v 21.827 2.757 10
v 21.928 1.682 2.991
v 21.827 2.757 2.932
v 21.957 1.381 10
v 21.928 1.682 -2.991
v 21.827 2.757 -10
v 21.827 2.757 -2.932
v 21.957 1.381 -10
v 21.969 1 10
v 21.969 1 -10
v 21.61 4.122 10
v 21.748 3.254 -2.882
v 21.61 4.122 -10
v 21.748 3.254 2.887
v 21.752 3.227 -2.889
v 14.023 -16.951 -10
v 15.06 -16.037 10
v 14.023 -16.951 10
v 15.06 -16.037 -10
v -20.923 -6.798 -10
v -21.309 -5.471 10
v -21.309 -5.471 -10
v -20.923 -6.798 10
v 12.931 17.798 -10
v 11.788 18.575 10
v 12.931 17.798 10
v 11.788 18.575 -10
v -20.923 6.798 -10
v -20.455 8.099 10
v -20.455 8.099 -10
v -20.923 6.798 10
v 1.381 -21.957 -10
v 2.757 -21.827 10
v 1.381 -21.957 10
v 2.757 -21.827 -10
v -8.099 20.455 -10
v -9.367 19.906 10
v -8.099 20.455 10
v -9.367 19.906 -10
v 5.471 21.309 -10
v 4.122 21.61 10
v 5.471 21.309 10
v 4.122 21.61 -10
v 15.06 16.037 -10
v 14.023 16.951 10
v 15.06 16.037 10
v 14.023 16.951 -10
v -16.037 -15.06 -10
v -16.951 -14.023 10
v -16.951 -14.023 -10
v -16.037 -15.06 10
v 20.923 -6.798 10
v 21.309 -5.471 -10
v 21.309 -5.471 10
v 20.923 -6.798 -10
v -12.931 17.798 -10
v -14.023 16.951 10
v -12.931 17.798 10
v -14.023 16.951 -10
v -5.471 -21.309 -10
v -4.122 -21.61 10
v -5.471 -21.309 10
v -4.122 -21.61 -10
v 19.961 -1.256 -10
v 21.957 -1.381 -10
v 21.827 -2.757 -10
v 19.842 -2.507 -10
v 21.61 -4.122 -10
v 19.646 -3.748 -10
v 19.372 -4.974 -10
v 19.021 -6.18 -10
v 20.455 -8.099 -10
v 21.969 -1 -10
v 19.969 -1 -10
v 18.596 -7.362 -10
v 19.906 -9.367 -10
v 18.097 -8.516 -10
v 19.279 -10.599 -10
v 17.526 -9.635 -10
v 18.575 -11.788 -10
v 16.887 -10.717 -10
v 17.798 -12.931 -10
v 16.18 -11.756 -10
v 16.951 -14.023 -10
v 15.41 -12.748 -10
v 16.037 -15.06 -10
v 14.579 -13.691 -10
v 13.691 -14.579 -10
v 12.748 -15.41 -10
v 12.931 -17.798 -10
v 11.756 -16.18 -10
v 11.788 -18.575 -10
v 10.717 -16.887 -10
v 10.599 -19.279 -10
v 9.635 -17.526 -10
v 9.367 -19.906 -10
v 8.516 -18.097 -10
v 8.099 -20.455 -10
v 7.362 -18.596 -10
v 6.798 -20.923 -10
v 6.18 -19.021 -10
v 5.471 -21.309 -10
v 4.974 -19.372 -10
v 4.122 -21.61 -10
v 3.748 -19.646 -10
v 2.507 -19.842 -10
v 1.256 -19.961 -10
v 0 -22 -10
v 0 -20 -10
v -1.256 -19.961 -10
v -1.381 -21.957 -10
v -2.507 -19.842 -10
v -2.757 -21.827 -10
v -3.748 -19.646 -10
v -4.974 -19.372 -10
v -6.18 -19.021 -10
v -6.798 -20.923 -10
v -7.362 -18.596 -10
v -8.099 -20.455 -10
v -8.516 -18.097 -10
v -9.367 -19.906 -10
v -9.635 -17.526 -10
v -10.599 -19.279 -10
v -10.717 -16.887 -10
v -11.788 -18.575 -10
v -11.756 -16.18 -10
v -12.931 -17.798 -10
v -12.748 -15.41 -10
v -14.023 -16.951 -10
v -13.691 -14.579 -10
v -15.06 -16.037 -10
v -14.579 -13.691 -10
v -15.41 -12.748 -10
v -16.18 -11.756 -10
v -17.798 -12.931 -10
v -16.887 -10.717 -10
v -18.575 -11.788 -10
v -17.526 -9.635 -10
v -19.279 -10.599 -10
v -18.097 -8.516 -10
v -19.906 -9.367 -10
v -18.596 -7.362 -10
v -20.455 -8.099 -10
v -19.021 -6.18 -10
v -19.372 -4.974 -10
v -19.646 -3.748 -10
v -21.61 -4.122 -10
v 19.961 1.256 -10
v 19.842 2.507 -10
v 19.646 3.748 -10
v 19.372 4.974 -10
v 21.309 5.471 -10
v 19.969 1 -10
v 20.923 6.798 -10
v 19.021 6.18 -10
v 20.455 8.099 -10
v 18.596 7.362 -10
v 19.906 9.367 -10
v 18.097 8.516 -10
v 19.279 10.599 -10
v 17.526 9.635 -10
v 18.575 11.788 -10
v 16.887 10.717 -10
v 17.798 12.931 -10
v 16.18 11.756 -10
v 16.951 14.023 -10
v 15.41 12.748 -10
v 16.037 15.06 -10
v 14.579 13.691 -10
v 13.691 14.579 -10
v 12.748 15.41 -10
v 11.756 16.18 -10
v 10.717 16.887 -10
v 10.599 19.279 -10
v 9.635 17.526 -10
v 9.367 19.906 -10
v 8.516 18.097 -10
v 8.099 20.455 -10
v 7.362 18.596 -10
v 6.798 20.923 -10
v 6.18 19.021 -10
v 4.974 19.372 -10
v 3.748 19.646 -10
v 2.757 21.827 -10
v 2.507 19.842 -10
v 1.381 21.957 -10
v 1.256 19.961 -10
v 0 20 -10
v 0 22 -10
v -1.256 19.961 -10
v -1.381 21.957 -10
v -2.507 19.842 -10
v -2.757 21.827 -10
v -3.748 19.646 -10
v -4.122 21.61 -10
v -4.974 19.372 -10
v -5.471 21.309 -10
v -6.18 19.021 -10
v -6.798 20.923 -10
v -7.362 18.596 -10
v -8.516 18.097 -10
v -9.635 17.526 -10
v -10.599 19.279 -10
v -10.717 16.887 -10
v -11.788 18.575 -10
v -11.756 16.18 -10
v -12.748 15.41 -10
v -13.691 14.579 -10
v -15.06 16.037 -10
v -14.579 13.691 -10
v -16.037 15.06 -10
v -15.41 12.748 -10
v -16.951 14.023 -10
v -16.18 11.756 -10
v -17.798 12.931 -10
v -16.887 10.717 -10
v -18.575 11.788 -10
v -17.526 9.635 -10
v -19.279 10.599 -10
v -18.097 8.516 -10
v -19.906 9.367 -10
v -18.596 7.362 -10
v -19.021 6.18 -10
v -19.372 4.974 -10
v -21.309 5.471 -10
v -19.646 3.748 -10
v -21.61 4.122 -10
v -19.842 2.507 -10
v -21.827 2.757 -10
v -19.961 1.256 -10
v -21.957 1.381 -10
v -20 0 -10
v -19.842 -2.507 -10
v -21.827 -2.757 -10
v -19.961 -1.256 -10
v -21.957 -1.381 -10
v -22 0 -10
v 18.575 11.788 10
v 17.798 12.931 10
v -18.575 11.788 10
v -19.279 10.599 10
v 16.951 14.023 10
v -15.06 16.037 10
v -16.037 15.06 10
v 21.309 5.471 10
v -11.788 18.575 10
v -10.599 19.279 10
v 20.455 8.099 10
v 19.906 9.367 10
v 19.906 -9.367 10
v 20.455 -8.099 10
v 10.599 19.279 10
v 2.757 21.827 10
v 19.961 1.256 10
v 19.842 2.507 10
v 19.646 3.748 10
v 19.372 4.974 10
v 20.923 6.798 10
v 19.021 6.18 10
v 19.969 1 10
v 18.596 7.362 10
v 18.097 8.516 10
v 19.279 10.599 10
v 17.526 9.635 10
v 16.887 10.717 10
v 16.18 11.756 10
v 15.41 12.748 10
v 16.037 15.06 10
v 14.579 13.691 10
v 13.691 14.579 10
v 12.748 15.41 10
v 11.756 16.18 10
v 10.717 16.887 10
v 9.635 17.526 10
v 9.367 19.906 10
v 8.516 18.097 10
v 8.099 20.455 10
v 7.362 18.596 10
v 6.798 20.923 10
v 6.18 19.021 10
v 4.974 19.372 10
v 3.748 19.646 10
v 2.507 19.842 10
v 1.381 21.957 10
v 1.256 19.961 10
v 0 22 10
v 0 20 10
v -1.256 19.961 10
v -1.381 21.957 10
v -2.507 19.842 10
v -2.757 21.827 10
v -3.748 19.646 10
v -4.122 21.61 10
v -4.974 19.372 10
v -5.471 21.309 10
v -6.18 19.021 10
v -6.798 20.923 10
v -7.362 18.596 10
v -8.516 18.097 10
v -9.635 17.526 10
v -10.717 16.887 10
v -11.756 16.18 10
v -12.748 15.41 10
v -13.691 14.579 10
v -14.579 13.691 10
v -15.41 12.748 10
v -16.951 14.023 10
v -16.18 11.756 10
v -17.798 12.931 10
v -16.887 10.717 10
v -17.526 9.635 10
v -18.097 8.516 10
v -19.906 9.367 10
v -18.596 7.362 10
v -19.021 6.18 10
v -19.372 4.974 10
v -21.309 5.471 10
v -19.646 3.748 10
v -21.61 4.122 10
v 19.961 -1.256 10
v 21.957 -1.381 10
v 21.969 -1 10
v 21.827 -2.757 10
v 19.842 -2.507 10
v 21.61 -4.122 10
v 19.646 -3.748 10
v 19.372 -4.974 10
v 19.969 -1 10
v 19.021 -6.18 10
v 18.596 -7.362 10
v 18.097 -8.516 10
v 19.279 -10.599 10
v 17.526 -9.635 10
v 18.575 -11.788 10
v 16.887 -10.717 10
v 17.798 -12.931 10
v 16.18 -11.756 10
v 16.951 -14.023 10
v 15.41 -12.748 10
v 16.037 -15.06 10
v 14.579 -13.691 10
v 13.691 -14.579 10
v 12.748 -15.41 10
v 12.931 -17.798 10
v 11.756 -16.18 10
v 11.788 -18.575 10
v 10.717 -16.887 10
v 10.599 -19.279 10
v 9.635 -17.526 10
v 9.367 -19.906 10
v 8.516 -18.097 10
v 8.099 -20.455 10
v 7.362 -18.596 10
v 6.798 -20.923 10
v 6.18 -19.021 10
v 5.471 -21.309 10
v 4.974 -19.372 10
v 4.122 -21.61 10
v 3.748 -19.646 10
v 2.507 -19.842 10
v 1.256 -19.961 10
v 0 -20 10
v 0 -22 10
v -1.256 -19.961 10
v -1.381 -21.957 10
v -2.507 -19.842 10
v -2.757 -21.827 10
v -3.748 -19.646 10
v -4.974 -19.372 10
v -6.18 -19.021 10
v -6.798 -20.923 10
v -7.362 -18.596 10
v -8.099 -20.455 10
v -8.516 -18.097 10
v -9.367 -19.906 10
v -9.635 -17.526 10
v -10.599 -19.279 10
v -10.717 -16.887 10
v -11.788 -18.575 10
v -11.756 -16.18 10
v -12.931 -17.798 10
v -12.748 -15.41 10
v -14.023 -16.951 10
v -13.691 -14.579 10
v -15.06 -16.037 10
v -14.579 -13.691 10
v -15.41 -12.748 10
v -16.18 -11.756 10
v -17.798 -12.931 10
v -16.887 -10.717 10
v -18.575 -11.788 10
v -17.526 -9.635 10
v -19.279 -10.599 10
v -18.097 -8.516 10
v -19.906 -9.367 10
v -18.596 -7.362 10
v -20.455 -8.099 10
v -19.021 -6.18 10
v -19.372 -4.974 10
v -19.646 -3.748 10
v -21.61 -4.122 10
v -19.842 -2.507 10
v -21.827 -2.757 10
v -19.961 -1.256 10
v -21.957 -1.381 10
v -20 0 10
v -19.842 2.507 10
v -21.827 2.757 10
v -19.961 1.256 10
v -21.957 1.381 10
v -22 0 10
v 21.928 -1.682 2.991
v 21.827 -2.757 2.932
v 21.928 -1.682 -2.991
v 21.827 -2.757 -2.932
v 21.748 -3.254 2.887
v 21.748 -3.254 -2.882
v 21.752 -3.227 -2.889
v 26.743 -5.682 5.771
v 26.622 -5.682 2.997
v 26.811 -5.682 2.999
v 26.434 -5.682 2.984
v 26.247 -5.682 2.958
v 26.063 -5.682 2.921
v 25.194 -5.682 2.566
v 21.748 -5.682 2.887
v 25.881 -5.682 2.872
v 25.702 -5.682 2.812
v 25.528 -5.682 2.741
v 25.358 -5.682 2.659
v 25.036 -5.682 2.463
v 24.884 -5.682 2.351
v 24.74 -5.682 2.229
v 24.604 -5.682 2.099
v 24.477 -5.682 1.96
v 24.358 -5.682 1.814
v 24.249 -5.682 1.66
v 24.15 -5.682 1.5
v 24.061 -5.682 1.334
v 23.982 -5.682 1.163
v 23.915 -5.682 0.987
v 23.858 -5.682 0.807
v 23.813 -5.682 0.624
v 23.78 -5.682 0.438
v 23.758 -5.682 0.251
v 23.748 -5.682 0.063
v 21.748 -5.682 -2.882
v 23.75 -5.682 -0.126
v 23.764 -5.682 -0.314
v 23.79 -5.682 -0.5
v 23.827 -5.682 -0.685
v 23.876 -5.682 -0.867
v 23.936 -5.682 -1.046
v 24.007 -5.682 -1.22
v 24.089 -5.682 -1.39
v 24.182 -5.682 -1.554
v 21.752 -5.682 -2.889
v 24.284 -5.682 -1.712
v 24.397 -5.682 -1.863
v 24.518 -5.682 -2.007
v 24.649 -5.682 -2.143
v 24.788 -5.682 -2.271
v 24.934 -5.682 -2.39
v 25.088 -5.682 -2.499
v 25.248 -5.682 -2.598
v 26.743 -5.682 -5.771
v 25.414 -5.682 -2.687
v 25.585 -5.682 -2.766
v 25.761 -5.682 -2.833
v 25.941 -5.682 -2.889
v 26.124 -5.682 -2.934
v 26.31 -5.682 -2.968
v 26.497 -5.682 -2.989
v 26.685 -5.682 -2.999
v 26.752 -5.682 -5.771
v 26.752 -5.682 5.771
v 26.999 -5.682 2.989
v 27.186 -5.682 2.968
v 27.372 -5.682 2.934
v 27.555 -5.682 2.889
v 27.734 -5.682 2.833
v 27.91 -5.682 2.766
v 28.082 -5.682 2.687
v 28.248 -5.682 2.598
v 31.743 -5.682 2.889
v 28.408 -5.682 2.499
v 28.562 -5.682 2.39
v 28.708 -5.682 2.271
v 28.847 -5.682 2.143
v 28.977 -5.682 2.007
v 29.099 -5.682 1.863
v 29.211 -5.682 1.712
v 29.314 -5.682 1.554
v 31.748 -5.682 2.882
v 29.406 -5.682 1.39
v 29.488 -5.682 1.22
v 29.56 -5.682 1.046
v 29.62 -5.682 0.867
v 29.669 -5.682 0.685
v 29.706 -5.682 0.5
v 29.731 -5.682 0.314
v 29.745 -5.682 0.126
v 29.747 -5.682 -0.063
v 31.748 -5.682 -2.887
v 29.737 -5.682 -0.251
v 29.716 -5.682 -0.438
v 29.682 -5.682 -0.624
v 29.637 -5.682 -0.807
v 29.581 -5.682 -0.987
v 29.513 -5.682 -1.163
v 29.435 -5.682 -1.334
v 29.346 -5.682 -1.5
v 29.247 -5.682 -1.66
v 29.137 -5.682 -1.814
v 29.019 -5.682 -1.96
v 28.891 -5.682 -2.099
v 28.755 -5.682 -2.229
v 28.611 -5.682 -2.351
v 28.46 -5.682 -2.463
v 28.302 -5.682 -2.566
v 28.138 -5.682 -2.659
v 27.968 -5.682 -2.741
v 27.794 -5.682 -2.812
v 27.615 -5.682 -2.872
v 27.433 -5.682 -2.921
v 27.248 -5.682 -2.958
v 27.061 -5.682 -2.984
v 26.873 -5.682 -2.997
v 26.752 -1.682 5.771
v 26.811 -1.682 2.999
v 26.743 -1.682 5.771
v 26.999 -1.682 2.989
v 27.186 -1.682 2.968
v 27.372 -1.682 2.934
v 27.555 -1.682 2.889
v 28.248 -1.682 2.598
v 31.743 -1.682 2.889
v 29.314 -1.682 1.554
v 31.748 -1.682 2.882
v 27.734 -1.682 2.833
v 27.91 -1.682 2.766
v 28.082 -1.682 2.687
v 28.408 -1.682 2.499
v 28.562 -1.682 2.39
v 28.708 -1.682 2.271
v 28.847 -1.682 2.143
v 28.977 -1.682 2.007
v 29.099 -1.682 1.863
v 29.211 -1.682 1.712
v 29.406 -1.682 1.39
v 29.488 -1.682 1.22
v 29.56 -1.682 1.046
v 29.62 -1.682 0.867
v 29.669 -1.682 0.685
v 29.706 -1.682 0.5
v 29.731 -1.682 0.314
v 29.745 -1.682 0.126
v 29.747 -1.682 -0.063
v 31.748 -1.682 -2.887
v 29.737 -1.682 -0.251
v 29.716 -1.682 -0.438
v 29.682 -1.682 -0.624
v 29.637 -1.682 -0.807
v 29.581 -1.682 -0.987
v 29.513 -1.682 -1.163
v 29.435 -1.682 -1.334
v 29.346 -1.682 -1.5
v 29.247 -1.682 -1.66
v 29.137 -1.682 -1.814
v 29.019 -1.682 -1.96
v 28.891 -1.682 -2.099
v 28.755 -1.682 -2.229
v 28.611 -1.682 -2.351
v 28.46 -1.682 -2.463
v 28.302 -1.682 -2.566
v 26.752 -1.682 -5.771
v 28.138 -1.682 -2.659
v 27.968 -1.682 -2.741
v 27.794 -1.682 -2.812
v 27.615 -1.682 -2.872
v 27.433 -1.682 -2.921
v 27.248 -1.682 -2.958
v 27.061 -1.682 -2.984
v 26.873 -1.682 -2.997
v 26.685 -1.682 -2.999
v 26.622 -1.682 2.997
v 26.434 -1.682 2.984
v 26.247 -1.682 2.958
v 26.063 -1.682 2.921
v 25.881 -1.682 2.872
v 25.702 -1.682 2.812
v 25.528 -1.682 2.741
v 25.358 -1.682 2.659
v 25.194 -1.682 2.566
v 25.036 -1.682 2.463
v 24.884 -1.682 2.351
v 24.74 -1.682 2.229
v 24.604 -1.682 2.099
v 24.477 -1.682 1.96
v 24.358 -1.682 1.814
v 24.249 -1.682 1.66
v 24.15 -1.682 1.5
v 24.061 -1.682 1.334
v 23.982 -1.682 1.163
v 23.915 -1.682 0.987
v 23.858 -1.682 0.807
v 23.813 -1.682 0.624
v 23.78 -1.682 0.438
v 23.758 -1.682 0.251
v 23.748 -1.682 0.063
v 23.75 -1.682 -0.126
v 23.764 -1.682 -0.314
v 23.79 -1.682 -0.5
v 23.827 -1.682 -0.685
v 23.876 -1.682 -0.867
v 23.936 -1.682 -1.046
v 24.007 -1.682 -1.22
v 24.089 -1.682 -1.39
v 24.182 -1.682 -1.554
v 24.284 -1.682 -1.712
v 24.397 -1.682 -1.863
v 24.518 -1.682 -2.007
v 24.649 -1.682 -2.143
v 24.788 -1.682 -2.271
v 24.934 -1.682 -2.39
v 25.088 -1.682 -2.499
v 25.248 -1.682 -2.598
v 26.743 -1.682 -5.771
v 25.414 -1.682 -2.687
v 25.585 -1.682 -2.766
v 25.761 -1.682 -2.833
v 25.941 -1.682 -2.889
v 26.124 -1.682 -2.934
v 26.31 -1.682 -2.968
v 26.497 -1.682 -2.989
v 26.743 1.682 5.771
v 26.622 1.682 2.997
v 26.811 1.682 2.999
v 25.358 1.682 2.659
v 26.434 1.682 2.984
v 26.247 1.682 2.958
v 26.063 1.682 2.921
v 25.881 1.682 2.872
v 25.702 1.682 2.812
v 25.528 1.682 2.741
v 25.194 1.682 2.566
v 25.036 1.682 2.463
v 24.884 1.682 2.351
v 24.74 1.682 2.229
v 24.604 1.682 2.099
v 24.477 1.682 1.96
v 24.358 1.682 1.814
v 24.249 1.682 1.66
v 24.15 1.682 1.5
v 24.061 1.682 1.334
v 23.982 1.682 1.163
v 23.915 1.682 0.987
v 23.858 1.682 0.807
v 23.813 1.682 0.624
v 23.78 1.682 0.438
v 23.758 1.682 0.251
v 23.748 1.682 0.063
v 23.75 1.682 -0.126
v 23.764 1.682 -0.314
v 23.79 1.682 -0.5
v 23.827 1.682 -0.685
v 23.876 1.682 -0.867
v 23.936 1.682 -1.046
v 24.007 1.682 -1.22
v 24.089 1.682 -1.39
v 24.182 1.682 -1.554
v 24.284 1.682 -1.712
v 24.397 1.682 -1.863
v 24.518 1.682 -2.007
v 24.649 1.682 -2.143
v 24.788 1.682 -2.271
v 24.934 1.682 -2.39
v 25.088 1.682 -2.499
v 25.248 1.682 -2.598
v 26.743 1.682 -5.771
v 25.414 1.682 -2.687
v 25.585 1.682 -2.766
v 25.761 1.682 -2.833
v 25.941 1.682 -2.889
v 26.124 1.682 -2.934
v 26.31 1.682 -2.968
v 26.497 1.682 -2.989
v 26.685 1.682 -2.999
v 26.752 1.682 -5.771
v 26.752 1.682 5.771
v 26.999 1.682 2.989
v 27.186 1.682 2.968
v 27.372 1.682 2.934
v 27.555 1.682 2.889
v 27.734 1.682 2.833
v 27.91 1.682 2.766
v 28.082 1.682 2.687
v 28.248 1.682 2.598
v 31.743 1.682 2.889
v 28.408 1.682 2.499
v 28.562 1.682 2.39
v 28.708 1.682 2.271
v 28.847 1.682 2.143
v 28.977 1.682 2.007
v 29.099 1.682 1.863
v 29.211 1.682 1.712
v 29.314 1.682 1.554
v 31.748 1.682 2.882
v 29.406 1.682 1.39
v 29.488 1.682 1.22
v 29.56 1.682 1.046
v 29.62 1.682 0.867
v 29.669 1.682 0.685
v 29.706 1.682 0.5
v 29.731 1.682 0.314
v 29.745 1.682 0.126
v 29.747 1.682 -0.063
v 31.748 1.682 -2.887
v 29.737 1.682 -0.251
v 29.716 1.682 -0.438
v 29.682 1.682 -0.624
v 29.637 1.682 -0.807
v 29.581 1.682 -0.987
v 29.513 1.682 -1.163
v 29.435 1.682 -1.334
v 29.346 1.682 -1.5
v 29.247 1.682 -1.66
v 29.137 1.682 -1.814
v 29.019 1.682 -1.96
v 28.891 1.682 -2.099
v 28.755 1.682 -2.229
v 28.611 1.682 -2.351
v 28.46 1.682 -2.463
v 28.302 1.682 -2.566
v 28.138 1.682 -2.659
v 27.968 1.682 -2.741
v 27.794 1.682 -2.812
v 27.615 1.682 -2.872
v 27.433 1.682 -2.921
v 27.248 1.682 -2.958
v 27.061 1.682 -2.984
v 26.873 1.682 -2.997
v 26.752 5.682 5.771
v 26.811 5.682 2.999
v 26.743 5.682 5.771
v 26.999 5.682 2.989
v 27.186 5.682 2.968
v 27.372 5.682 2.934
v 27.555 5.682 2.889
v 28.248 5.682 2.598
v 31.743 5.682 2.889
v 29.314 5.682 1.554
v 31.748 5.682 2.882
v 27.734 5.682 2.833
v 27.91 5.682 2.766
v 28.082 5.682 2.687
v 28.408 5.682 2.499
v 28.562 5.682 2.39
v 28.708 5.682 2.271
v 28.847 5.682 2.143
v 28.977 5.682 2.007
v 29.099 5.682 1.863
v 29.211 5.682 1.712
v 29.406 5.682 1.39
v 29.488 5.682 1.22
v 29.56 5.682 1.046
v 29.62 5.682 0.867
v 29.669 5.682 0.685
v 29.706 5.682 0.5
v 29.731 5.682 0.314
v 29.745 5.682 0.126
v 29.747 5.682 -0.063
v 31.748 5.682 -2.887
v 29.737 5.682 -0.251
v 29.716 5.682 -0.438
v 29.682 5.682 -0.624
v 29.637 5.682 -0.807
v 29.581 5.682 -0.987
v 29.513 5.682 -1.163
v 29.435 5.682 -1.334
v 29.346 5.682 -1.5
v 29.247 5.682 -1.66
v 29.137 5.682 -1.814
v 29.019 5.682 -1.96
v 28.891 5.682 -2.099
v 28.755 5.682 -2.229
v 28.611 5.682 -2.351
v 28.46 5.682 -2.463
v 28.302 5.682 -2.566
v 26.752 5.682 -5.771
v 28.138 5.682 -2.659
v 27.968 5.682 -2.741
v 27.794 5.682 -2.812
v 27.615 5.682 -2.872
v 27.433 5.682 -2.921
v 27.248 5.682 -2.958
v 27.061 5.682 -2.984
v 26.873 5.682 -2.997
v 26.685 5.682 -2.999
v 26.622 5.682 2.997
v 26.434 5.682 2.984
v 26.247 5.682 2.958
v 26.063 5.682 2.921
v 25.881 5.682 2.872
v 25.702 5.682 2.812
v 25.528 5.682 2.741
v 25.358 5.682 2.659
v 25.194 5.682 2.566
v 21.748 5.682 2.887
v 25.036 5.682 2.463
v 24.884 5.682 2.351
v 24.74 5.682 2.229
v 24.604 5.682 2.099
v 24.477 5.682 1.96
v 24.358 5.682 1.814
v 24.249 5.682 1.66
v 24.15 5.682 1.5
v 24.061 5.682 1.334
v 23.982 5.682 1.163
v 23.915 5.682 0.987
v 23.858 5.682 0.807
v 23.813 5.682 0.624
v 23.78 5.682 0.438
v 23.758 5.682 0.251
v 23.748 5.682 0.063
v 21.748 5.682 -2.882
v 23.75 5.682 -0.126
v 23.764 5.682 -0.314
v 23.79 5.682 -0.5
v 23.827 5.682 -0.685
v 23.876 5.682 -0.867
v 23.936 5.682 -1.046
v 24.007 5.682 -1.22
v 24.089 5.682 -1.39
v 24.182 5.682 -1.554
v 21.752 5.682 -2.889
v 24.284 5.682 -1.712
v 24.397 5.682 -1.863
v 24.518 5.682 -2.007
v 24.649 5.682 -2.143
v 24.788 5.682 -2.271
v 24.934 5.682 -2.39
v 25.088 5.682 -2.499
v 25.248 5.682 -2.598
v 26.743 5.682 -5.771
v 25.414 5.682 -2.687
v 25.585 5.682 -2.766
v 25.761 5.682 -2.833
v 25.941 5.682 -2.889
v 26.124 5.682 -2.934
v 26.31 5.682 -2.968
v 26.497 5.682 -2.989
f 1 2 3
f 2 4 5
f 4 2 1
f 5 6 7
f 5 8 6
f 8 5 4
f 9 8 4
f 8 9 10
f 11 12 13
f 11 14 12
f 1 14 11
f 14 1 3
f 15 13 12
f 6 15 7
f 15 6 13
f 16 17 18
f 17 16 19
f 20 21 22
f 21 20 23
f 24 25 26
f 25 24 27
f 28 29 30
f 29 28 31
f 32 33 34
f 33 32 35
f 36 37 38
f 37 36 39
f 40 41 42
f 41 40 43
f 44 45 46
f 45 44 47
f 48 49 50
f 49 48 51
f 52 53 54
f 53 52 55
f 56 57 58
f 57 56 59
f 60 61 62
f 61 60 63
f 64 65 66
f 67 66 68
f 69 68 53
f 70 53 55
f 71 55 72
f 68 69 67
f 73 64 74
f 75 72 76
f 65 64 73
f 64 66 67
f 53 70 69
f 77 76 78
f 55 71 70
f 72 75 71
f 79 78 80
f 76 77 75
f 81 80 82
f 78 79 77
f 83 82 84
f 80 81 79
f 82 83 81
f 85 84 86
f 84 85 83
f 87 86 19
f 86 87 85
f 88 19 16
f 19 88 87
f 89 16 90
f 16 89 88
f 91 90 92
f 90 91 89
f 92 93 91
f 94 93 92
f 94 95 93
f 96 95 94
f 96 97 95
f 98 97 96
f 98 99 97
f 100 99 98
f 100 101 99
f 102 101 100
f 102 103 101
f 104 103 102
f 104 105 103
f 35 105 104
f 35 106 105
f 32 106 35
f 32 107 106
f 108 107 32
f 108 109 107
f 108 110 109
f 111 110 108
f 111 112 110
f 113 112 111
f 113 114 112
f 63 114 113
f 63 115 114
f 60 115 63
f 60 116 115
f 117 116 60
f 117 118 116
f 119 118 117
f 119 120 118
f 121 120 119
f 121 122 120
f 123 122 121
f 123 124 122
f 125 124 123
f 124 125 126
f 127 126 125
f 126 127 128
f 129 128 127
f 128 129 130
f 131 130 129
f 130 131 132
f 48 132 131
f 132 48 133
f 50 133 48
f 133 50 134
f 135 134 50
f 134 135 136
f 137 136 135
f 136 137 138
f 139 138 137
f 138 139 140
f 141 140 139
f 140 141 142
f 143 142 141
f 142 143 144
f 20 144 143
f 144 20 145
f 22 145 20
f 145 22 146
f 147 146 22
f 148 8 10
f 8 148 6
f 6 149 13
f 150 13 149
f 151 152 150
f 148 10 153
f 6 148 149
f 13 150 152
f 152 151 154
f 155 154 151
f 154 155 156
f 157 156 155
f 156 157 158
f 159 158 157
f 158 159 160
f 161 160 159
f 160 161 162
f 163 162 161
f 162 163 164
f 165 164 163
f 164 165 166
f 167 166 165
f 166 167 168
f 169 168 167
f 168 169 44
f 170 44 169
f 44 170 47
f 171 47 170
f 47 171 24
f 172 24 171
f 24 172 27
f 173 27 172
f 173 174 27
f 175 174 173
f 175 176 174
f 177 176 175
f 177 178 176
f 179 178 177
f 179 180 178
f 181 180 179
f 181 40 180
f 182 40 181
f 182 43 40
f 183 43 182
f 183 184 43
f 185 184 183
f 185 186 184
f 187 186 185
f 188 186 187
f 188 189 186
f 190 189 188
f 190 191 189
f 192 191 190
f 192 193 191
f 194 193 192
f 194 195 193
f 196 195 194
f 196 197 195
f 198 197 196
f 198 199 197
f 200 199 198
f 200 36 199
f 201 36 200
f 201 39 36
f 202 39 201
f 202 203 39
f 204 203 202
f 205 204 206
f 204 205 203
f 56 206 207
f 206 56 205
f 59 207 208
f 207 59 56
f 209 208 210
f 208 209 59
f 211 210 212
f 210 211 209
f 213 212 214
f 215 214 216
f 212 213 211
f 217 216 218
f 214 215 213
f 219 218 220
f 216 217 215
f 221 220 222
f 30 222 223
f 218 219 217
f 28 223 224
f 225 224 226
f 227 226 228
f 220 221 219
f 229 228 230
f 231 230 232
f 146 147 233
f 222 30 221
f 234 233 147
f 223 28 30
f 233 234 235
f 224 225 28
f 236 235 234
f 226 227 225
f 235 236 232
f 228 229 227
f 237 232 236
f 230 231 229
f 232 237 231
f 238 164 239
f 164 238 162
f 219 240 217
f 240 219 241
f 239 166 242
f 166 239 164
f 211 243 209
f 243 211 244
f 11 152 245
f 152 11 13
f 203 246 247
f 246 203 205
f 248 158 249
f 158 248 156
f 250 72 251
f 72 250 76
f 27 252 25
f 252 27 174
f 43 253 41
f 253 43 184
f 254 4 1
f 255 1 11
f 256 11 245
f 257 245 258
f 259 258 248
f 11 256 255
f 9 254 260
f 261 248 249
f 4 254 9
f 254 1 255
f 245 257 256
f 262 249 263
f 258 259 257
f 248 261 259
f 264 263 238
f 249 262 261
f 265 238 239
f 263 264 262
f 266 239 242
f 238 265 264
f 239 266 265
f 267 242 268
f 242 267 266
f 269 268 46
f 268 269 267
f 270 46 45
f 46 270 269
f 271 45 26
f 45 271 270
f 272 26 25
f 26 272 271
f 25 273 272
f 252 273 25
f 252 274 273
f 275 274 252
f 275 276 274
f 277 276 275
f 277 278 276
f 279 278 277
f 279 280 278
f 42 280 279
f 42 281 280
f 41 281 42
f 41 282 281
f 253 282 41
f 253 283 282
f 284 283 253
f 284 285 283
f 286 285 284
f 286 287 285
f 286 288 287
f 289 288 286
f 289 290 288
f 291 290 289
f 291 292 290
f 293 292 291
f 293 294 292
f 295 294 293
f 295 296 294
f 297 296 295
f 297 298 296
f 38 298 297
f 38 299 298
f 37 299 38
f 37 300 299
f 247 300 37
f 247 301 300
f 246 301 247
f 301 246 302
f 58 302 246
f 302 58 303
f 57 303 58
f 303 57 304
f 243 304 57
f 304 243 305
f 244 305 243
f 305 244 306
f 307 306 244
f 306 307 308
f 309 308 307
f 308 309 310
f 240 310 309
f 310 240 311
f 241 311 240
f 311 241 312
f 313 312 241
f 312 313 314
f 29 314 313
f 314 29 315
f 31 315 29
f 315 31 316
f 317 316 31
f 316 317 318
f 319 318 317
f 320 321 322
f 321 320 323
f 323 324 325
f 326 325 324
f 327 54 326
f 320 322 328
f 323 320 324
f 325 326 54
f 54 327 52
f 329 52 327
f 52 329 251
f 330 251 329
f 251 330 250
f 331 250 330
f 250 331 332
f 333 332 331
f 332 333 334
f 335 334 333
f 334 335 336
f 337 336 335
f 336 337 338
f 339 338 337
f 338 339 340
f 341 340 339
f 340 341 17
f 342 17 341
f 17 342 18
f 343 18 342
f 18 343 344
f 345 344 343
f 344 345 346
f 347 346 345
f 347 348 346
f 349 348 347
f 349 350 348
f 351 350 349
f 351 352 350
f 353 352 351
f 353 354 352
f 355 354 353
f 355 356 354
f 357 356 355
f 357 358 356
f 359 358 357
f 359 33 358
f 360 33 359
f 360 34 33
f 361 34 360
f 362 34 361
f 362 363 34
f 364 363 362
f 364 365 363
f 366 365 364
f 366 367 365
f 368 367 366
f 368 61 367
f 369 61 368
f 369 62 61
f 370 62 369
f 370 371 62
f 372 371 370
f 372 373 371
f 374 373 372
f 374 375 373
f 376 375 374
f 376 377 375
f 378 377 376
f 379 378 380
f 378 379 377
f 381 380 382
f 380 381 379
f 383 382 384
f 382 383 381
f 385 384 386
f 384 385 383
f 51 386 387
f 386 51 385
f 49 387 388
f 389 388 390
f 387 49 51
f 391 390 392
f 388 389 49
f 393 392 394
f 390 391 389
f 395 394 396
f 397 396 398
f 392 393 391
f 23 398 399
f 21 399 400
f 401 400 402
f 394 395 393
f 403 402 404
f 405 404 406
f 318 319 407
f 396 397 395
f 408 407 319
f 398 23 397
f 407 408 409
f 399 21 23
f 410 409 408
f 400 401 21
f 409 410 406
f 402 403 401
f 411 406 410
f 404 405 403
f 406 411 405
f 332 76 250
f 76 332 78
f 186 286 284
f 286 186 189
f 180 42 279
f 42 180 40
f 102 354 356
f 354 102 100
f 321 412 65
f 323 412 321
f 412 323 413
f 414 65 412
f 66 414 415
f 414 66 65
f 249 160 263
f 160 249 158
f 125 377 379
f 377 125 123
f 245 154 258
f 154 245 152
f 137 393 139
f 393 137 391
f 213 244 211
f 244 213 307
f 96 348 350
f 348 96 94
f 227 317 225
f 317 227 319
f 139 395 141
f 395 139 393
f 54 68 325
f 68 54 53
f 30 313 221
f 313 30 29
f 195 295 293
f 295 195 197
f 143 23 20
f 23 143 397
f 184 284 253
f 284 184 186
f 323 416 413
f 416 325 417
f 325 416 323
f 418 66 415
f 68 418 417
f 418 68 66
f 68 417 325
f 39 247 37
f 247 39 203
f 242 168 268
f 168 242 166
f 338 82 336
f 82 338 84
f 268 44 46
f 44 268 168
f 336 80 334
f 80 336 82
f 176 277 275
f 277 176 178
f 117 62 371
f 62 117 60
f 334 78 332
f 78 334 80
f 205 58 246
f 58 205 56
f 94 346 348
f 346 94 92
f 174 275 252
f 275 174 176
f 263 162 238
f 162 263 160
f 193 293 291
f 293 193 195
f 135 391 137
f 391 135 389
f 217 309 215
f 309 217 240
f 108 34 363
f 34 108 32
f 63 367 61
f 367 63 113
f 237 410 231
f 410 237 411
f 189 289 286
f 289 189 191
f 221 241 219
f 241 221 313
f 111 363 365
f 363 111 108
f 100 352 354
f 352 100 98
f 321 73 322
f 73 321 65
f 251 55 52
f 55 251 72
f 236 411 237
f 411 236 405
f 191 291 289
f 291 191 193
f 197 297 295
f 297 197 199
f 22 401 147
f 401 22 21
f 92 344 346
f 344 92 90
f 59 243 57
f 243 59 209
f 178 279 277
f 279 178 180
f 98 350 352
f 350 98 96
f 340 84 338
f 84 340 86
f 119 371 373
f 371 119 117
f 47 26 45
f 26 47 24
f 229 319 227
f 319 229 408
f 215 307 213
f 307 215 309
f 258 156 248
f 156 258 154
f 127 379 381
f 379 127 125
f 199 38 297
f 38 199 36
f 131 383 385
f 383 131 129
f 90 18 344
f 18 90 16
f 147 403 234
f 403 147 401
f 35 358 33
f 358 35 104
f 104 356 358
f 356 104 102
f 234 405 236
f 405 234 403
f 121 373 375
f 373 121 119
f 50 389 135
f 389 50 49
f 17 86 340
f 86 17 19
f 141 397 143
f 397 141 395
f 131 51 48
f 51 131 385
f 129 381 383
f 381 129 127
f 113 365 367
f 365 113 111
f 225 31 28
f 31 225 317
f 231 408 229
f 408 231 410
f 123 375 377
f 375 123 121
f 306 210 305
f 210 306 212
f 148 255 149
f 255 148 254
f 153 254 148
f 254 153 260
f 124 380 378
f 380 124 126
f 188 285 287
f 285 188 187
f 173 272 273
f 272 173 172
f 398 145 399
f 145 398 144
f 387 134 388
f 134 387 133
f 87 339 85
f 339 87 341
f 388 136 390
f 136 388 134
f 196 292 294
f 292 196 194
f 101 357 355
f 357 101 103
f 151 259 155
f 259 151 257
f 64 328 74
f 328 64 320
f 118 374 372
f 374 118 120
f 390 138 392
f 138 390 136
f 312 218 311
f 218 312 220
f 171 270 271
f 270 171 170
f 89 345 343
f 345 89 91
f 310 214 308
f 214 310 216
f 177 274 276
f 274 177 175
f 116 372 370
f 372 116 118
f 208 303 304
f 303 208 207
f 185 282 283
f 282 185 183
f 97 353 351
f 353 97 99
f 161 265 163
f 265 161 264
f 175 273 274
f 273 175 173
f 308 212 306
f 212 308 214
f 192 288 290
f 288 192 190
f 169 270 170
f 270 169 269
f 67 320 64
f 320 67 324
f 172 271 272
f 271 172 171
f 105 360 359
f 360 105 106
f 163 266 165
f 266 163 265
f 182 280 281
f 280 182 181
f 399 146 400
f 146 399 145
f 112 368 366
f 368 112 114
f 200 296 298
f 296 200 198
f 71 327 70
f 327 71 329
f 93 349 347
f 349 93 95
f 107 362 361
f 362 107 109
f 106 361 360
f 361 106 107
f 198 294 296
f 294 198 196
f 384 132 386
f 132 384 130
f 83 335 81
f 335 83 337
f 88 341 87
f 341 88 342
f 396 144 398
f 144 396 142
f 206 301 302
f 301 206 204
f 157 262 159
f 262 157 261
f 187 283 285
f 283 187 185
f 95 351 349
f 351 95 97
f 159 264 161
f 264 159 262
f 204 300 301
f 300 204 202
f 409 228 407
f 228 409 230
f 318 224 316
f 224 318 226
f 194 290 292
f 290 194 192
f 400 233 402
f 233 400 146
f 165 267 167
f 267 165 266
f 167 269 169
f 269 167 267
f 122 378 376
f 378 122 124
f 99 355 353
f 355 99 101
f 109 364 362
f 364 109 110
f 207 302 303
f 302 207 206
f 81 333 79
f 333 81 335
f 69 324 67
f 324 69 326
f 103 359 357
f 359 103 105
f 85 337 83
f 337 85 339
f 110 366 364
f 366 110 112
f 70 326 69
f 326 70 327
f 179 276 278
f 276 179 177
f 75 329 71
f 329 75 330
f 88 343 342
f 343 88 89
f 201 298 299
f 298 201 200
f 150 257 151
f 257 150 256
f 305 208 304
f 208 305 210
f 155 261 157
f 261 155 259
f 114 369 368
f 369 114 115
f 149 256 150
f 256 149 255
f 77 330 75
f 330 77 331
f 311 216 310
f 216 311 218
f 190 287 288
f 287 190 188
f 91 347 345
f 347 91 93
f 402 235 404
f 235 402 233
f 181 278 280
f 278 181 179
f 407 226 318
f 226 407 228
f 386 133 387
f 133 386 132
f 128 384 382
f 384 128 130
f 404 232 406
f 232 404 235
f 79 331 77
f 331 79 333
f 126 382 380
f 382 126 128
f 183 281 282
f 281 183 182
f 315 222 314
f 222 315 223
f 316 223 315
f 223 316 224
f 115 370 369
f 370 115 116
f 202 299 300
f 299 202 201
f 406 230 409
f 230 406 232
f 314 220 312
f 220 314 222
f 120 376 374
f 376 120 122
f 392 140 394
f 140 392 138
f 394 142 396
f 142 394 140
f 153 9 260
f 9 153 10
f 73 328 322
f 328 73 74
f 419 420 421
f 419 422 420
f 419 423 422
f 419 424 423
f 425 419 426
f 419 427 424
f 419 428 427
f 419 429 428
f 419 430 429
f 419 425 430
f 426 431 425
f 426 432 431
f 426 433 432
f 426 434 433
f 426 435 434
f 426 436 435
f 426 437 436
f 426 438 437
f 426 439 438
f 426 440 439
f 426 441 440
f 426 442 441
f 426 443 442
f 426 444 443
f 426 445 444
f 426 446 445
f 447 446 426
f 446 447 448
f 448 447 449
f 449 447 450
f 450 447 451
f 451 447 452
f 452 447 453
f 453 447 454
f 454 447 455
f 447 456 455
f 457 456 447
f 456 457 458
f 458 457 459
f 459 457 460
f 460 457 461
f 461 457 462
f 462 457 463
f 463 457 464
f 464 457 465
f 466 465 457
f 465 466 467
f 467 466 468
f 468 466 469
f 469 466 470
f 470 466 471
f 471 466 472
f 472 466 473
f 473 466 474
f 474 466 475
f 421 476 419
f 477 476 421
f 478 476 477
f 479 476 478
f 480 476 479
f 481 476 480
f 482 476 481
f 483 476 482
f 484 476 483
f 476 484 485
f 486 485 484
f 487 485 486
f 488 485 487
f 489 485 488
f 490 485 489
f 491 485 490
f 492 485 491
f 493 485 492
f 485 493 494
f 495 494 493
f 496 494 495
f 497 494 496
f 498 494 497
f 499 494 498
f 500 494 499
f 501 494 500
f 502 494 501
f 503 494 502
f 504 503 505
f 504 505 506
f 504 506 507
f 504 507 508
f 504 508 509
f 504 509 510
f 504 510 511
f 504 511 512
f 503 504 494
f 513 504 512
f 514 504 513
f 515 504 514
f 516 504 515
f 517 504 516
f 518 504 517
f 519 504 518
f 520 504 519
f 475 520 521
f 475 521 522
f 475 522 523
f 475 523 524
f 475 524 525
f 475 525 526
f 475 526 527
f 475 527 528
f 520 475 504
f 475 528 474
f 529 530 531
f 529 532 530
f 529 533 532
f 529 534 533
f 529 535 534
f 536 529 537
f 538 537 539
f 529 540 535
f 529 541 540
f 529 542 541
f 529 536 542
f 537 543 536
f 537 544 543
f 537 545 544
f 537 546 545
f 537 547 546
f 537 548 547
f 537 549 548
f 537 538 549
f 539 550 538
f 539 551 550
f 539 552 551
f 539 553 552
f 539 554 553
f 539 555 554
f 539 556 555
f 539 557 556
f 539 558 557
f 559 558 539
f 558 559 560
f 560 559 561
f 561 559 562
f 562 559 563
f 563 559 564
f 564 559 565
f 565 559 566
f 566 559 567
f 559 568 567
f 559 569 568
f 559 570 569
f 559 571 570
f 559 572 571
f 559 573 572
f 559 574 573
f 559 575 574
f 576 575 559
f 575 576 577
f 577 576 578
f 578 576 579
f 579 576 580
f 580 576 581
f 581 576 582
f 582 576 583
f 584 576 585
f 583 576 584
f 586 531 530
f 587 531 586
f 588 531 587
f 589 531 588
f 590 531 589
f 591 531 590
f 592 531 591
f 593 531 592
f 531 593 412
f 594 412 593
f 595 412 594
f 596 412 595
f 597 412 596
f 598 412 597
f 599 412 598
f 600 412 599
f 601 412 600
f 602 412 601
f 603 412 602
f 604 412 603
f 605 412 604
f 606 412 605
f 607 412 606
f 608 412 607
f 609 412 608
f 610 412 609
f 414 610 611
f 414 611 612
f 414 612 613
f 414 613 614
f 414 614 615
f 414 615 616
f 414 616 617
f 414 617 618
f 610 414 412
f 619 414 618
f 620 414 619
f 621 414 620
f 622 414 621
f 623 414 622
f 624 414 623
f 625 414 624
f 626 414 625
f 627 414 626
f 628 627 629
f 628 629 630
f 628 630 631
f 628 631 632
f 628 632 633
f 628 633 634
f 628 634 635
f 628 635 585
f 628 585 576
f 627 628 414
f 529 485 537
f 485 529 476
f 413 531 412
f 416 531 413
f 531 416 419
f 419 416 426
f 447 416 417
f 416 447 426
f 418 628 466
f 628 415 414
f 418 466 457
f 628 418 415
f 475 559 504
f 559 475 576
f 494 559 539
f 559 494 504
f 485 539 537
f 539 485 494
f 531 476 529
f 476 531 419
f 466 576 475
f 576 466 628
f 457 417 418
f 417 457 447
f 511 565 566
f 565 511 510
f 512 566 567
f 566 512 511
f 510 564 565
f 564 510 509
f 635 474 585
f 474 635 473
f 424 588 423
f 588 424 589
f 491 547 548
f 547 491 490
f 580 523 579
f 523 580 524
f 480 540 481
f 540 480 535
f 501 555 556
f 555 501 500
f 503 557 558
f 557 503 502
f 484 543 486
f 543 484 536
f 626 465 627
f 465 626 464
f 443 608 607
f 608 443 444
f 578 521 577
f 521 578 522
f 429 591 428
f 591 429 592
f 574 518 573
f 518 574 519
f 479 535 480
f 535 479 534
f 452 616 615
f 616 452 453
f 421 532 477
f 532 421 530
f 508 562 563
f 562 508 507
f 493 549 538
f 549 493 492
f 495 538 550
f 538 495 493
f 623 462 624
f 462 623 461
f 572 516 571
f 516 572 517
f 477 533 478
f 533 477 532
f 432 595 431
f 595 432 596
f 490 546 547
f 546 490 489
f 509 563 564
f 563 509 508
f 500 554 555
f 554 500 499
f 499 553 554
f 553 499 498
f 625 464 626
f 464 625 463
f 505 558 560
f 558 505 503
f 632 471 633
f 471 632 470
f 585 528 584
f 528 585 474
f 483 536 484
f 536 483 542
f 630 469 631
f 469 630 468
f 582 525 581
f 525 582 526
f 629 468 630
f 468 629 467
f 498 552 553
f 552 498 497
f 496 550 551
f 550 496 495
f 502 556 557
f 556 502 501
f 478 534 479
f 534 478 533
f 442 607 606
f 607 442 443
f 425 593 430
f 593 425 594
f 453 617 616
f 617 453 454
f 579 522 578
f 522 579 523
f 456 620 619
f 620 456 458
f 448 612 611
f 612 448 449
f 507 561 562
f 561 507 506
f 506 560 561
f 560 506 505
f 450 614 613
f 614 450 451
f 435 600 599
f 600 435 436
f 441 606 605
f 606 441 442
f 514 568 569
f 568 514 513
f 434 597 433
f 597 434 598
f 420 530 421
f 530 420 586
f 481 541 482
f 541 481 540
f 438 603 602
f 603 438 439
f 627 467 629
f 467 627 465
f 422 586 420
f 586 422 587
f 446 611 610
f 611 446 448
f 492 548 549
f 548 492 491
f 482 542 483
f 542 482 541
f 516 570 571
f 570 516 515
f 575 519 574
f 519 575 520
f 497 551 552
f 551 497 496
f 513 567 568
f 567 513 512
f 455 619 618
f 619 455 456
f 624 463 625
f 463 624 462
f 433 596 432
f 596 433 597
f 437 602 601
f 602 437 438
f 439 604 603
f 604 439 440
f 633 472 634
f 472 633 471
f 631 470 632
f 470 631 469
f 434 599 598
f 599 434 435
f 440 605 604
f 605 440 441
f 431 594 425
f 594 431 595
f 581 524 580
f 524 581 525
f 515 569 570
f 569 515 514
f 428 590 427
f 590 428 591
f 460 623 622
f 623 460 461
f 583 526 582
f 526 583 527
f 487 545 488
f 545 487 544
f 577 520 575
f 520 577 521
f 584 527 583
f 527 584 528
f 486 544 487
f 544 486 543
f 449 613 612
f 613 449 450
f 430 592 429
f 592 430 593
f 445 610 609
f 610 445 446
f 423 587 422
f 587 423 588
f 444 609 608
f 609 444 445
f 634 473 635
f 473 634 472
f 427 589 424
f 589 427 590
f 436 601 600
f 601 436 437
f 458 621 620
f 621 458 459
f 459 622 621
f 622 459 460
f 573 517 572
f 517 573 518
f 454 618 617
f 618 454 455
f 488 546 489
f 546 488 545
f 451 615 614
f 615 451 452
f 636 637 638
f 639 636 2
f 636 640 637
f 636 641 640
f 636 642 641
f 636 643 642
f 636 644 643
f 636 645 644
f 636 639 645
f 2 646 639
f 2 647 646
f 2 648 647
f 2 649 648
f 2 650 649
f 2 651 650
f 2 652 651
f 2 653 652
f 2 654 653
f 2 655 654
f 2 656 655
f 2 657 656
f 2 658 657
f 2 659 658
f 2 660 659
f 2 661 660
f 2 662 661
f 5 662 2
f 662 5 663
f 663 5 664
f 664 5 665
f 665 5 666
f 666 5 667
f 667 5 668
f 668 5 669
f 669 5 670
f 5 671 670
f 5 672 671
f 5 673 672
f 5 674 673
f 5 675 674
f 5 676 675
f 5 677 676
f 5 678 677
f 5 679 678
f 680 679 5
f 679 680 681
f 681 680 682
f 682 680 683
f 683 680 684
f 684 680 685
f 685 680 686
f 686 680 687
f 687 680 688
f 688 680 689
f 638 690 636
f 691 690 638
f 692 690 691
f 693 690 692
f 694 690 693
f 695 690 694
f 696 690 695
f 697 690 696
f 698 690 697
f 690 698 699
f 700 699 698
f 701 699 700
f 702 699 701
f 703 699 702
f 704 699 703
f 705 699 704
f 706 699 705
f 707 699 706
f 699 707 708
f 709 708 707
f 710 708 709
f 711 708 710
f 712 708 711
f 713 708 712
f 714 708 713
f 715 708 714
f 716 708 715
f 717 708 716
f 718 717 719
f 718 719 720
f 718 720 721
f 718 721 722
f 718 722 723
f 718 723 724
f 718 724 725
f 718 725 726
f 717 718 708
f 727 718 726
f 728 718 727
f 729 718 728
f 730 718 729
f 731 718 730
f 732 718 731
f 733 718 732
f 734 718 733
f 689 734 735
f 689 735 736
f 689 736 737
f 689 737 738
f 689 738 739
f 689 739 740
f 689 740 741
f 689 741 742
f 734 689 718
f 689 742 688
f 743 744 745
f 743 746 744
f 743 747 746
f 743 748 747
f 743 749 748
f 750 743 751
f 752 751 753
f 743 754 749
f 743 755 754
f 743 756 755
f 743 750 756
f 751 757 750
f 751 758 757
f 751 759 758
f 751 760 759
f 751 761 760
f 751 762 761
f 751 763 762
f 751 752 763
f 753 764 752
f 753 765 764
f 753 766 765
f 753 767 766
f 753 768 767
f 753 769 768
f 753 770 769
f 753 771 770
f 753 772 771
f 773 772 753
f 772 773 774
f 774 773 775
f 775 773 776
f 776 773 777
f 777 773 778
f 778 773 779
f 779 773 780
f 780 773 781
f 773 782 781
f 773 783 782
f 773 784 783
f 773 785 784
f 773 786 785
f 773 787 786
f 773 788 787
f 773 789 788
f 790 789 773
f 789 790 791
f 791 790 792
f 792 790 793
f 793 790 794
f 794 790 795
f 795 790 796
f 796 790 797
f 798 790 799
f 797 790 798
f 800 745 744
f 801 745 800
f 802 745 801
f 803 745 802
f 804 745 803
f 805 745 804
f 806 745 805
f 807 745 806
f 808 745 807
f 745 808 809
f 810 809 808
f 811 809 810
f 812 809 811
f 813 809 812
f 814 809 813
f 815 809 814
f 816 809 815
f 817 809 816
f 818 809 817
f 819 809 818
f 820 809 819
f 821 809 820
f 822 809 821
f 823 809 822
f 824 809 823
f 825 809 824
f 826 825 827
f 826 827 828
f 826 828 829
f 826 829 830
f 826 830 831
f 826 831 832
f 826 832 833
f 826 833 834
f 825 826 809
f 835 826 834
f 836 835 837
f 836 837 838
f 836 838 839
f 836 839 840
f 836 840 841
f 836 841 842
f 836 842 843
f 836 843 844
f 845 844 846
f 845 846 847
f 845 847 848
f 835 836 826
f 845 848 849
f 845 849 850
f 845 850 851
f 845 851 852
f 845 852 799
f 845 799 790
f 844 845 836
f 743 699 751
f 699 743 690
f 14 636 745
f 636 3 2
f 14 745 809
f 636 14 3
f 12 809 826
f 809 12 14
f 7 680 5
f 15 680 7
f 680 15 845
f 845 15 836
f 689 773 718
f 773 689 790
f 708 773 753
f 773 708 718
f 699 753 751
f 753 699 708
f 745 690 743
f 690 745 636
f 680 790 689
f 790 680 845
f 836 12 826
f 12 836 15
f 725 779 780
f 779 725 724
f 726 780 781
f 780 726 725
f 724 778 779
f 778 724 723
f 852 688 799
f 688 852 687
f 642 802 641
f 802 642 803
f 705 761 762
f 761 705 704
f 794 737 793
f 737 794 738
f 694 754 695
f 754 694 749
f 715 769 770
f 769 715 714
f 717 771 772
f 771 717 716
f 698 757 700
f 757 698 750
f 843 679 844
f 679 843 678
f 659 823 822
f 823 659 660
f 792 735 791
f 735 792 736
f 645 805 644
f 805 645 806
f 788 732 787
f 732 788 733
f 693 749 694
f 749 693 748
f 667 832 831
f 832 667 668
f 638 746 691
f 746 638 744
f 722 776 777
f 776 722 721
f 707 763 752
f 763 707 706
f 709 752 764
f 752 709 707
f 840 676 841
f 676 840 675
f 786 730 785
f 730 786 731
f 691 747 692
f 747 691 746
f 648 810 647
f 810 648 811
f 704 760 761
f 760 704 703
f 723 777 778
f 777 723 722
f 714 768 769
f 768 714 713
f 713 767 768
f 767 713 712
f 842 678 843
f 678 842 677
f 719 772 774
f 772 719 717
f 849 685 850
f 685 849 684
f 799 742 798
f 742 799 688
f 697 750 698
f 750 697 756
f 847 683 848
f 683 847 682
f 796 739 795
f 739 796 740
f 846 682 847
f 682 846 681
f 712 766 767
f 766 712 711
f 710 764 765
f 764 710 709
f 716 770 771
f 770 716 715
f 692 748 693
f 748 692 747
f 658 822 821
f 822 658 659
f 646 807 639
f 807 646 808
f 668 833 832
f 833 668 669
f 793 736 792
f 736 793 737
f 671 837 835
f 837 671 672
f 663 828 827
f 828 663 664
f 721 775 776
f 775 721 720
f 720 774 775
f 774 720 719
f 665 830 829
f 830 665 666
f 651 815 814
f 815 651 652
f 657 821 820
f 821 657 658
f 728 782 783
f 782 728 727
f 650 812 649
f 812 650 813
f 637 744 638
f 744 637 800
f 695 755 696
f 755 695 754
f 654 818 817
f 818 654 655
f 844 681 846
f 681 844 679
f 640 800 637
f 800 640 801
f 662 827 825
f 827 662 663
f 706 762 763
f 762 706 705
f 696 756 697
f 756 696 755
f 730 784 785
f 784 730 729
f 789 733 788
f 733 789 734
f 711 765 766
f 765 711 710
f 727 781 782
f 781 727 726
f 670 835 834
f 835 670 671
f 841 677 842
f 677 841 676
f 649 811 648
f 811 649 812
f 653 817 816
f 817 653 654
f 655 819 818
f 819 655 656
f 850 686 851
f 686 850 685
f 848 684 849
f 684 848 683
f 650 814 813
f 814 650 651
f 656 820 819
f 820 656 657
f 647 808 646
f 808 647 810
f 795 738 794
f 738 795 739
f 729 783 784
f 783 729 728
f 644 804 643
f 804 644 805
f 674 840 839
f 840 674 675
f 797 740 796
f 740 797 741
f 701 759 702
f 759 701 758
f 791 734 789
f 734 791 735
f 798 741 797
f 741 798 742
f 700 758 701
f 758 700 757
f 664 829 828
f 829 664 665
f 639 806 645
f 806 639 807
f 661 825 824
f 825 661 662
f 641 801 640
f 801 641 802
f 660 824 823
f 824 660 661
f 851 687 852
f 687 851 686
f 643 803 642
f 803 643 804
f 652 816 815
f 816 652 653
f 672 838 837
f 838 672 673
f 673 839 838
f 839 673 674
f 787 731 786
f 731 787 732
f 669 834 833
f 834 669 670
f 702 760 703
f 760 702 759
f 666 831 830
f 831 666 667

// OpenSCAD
/* drill press */
$fn = 100;

holder(h = 20, r = 20, w = 2);

module nut(d1, d2, h) {
  r1 = d1 / 2;
  r2 = d2 / 2;
  ro = r1 / sin(60);

  difference() {
    cylinder(h = h, r = ro, center = true);
    cylinder(h = h, r = r2, center = true);
    for (i = [0:5]) {
      rotate(i * 60, 0, 0) {
        translate([0, ro / 2 + r1, 0]) {
          cube([ro, ro, h], center = true);
        }
      }
    }
  }
}

module holder(h, r, w) {
  gap = 2;
  rnut = 5;
  dnut = 4;

  difference() {
    cylinder(h = h, r = r + w, center = true);
    cylinder(h = h, r = r, center = true);
    translate([0, - gap / 2, - h / 2]) {
      cube([r + w, gap, h]);
    }
  }

  deg = asin((gap + dnut) / 2 / (r + w));
  for (i = [-1, 1]) {
    rotate([0, 0, i * deg]) {
      translate([r + w + rnut, 0, 0]) {
        rotate([90, 30, -i * deg]) {
          nut(d1 = 2 * rnut, d2 = 2 * rnut * 0.6, h = dnut);
        }
      }
    }
  }
}
